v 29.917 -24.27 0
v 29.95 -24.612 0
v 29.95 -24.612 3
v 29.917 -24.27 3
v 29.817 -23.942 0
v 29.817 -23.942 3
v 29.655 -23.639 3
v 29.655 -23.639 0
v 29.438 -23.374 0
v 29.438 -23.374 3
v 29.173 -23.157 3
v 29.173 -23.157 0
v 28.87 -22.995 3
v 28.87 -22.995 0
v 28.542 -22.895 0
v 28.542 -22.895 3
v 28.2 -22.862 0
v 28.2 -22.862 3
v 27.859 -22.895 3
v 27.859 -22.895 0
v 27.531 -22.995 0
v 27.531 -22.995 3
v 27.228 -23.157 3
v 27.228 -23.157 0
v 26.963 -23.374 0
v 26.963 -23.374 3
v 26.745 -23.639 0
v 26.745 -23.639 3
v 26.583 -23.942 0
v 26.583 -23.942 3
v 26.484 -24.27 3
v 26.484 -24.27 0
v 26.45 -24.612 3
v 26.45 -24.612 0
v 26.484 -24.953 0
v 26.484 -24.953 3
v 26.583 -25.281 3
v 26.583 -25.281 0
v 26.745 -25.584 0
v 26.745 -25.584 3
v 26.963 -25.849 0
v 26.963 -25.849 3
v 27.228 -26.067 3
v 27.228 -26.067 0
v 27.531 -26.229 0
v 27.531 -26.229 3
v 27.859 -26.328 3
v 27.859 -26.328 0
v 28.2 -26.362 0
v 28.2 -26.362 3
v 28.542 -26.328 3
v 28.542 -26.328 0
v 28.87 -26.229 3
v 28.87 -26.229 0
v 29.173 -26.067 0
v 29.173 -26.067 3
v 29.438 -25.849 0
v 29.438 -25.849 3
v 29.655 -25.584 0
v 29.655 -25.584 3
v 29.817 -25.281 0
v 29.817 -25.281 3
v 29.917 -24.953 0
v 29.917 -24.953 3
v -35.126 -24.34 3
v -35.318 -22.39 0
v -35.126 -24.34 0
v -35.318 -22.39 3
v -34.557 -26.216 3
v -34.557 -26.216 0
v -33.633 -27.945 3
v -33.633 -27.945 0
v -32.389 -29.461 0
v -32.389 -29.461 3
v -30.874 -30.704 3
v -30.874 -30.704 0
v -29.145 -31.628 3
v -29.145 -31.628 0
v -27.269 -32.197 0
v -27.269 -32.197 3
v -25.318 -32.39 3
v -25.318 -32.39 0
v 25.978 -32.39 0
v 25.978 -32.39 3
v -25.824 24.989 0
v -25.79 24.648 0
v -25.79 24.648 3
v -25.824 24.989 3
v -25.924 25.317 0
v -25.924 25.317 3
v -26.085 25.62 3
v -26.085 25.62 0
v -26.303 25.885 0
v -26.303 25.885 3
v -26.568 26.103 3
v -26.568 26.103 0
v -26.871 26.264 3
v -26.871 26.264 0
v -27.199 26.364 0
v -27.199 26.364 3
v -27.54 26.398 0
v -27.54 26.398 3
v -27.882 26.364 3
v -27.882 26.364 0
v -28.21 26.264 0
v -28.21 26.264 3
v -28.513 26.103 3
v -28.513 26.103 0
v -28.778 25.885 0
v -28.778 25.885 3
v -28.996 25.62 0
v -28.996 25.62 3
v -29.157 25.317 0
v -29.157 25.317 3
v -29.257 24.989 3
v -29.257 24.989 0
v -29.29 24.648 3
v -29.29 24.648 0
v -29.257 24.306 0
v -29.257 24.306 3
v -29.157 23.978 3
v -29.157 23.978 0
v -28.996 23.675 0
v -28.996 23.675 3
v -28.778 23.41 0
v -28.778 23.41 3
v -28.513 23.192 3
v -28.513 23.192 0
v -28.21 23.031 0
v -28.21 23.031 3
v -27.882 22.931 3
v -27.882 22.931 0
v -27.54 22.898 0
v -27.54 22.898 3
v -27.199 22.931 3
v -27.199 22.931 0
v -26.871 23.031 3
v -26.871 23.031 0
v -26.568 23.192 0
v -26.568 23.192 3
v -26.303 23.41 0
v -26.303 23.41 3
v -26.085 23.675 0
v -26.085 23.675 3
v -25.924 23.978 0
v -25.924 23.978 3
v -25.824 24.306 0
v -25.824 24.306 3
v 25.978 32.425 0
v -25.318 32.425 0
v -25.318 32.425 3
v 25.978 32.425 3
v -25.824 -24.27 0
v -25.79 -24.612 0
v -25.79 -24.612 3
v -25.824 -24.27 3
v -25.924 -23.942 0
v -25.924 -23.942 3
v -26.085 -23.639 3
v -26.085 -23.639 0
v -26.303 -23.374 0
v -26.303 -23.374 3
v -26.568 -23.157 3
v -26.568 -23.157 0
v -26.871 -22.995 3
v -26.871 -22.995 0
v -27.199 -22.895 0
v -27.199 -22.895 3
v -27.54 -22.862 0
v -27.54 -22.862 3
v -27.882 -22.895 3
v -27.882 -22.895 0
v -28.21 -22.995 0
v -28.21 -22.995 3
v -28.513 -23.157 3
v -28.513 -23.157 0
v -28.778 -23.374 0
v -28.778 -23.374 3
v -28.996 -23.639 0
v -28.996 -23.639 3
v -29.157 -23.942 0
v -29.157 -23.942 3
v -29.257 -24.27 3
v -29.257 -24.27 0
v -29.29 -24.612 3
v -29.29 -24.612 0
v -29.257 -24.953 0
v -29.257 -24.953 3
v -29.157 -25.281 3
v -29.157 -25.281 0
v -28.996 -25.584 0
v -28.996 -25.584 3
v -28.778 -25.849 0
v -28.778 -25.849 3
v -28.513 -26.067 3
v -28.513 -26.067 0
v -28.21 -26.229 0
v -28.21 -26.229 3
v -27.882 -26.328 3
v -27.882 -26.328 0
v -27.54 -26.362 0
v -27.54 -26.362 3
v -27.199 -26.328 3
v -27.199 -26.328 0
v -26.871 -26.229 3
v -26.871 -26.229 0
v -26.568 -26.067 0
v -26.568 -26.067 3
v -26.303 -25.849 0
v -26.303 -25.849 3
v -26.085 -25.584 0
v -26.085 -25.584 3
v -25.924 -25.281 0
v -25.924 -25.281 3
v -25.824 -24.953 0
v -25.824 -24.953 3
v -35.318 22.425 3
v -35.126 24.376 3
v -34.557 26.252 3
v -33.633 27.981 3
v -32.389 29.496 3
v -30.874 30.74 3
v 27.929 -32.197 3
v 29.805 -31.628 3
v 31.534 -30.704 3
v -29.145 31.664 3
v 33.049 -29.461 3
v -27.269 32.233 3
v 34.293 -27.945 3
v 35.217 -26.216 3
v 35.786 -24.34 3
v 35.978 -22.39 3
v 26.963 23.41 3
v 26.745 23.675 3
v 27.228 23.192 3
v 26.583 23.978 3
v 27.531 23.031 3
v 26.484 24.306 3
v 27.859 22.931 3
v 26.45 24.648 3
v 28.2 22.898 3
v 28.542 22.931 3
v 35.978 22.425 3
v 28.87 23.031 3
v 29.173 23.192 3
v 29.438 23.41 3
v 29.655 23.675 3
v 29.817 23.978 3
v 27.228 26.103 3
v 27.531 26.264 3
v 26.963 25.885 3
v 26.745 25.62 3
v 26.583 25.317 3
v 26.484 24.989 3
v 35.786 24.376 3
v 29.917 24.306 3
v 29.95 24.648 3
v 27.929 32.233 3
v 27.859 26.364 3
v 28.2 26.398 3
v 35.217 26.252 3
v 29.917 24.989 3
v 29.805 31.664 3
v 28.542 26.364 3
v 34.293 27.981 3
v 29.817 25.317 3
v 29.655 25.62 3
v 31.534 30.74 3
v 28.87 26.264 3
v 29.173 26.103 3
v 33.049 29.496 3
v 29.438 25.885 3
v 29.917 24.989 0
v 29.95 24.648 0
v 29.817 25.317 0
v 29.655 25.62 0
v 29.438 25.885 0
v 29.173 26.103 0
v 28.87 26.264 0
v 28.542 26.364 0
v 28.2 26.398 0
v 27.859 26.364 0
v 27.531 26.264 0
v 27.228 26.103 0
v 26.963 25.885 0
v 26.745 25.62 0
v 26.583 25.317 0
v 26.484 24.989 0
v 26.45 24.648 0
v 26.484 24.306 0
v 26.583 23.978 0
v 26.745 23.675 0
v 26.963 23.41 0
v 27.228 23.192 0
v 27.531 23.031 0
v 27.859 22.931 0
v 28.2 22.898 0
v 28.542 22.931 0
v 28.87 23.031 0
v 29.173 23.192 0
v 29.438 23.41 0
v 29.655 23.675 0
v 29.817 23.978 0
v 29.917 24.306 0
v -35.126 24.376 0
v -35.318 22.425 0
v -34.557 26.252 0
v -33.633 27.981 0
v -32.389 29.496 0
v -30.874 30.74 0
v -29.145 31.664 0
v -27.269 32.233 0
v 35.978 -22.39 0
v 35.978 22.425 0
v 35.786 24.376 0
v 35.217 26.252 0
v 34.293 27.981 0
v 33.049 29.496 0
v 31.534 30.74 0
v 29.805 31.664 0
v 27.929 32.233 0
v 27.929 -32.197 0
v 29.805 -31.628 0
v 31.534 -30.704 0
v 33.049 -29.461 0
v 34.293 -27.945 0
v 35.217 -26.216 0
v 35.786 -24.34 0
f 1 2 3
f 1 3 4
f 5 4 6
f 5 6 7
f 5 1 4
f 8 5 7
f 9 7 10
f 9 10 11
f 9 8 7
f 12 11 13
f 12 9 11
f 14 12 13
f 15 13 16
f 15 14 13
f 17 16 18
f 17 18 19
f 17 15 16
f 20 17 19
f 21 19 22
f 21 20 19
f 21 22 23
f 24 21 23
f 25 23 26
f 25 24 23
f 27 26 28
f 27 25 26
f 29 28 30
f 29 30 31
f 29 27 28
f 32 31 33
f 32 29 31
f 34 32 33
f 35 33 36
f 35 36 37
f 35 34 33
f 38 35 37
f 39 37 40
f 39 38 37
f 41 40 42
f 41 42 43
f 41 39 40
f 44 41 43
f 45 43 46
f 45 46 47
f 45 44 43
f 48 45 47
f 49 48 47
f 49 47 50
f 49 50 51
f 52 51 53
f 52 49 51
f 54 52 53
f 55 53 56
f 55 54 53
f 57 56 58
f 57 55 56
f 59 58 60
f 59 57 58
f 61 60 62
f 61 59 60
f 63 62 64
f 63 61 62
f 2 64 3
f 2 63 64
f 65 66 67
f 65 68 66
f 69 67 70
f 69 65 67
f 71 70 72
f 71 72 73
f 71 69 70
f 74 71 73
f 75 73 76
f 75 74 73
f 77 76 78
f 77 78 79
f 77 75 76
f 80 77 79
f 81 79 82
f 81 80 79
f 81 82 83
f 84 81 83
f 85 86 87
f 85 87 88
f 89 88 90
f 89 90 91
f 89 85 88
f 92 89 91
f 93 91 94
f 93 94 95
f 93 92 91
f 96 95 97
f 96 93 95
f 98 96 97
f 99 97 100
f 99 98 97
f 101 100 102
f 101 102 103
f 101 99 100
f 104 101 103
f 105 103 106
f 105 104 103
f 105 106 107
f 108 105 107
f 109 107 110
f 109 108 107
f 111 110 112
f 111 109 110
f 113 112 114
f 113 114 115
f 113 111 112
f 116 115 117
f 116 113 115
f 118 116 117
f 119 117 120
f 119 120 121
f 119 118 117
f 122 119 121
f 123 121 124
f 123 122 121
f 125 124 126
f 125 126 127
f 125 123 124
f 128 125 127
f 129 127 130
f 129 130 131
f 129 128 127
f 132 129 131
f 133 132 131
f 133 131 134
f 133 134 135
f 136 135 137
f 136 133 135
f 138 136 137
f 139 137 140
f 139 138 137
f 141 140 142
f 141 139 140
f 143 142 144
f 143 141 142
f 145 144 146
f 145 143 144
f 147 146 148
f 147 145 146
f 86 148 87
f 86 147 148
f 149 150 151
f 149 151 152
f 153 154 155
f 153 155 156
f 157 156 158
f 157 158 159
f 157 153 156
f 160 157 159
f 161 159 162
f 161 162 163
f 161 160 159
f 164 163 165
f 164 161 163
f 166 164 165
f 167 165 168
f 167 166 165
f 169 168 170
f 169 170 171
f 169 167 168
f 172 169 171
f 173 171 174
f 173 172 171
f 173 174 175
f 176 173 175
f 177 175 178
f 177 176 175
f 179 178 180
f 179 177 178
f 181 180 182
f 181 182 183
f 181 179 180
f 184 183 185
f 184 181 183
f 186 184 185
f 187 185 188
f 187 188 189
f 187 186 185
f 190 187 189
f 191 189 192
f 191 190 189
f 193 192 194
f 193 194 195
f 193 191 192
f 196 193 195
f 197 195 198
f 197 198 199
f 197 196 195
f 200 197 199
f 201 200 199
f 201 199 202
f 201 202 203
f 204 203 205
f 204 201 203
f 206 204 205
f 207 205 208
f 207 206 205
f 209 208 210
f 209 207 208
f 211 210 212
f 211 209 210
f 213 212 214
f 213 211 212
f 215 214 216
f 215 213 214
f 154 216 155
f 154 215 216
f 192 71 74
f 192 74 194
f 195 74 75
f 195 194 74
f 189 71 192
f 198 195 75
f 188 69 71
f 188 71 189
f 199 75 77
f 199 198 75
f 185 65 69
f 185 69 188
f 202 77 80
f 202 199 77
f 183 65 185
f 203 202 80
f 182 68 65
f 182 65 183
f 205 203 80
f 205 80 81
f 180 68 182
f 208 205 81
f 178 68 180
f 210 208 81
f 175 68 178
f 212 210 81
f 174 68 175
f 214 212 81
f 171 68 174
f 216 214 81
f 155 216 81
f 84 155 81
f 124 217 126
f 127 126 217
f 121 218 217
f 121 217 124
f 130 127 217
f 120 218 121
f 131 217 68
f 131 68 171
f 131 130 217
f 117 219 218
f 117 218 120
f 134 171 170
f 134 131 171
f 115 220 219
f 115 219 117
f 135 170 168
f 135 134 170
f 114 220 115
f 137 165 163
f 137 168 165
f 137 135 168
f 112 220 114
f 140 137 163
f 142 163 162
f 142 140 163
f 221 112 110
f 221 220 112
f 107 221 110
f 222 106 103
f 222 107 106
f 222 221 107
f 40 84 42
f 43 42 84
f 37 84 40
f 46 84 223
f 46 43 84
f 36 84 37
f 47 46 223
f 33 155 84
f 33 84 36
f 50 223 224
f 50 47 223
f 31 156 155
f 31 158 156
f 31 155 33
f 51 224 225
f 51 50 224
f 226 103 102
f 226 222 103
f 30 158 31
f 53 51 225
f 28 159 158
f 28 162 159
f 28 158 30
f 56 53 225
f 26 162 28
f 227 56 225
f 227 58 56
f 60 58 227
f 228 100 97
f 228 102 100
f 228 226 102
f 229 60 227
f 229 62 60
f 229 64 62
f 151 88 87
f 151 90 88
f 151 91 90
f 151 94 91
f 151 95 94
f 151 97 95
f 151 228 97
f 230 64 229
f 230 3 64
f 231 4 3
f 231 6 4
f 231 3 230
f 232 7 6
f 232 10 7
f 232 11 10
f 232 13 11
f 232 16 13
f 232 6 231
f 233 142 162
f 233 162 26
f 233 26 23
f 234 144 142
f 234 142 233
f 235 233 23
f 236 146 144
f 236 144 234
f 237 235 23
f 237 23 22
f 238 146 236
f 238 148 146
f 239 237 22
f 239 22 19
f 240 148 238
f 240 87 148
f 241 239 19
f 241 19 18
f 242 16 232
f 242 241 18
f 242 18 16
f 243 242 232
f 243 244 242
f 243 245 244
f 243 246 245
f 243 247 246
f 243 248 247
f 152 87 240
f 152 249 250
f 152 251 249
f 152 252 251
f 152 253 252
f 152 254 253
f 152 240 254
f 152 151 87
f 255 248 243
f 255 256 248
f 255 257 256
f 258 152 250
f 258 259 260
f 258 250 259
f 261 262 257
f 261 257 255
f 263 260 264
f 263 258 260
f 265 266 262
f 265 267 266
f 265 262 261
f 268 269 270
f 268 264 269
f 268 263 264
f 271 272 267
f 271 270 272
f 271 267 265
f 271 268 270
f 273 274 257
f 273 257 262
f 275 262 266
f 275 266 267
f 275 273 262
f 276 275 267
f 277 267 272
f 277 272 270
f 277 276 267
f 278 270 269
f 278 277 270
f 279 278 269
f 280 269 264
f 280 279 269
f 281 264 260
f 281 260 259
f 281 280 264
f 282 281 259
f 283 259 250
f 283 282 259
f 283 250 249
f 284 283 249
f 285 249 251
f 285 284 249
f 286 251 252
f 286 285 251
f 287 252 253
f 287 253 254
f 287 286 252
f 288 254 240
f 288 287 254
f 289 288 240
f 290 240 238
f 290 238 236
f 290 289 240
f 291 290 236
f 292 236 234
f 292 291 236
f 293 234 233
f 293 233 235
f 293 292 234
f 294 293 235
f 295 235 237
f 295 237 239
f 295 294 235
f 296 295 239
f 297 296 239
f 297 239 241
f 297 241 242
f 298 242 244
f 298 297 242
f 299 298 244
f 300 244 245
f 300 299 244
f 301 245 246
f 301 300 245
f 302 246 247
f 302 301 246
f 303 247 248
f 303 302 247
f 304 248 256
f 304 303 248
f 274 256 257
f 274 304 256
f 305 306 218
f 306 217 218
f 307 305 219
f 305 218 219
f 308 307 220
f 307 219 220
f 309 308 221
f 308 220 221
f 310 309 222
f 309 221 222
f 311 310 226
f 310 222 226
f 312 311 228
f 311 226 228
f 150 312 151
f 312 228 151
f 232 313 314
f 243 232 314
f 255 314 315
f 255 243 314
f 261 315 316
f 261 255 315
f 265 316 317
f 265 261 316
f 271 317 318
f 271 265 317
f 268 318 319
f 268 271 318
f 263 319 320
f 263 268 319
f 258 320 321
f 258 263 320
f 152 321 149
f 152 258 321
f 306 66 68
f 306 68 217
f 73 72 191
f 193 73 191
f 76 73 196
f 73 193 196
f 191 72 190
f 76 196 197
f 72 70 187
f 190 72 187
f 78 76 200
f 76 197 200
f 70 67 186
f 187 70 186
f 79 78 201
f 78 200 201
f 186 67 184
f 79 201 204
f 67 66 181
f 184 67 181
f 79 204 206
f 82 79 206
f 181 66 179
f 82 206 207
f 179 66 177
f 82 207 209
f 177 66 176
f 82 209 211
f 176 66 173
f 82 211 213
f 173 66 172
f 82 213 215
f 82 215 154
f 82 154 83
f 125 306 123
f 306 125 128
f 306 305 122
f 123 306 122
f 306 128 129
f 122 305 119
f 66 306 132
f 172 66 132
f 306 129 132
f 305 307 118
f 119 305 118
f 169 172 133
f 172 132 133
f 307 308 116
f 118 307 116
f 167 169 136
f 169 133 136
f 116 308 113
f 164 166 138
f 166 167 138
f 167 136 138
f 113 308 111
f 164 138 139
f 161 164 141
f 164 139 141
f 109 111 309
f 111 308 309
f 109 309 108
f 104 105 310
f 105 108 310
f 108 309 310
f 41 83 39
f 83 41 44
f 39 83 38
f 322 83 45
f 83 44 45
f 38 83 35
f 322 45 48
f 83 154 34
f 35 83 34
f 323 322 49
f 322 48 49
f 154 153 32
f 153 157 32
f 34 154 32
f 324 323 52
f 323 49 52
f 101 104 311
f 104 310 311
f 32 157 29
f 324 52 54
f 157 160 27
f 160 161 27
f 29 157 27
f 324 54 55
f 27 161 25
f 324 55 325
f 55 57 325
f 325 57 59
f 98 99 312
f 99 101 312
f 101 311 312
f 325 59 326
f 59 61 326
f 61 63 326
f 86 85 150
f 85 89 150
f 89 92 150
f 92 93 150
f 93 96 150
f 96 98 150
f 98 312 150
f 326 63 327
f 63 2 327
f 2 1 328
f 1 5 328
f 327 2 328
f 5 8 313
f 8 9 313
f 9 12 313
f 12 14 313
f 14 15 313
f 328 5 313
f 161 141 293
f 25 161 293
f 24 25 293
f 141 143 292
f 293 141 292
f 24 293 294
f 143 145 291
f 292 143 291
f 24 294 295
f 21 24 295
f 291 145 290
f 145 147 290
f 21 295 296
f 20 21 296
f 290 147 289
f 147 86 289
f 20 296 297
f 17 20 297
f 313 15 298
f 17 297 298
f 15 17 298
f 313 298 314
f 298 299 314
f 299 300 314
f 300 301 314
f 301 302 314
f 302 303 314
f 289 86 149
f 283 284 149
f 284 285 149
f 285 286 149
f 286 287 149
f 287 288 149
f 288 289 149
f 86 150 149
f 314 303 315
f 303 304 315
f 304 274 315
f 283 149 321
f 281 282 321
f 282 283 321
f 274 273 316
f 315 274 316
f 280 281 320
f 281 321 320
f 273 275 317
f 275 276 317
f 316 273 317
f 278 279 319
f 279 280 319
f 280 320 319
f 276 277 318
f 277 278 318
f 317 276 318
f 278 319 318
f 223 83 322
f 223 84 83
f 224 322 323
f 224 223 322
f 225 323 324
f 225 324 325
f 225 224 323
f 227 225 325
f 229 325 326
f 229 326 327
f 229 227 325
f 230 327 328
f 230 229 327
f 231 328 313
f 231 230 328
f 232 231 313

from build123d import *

# Parameters (mm, degrees)
SKETCH_1_W      = 71.296296296
SKETCH_1_H      = 64.814814815
SKETCH_1_R      = 1.75
SKETCH_1_W_2    = 45.37037037
SKETCH_1_H_2    = 38.888888889
EXTRUDE_1_DEPTH = 3
FILLET_1_R      = 10


with BuildPart() as part:
    # 草图1 → 凸台-拉伸1 (new body)
    with BuildSketch(Plane.XY):
        with Locations((0.329915923, 0.017888572)):
            Rectangle(SKETCH_1_W, SKETCH_1_H)
        with Locations((-27.540454447, -24.611741059)):
            Circle(SKETCH_1_R, mode=Mode.SUBTRACT)
        with Locations((28.200286294, -24.611741059)):
            Circle(SKETCH_1_R, mode=Mode.SUBTRACT)
        with Locations((28.200286294, 24.647518201)):
            Circle(SKETCH_1_R, mode=Mode.SUBTRACT)
        with Locations((-27.540454447, 24.647518201)):
            Circle(SKETCH_1_R, mode=Mode.SUBTRACT)
        with Locations((0.329915923, 0.017888572)):
            Rectangle(SKETCH_1_W_2, SKETCH_1_H_2, mode=Mode.SUBTRACT)
        with Locations((0.329915923, 0.017888572)):
            Rectangle(SKETCH_1_W_2, SKETCH_1_H_2)
    extrude(amount=EXTRUDE_1_DEPTH)

    # 圆角1
    fillet_1_edges = [part.edges().sort_by_distance(p)[0] for p in [
        (35.978064071, 32.425295979, 1.5),
        (35.978064071, -32.389518836, 1.5),
        (-35.318232225, -32.389518836, 1.5),
        (-35.318232225, 32.425295979, 1.5),
    ]]
    fillet(fillet_1_edges, radius=FILLET_1_R)


solid = part.part
